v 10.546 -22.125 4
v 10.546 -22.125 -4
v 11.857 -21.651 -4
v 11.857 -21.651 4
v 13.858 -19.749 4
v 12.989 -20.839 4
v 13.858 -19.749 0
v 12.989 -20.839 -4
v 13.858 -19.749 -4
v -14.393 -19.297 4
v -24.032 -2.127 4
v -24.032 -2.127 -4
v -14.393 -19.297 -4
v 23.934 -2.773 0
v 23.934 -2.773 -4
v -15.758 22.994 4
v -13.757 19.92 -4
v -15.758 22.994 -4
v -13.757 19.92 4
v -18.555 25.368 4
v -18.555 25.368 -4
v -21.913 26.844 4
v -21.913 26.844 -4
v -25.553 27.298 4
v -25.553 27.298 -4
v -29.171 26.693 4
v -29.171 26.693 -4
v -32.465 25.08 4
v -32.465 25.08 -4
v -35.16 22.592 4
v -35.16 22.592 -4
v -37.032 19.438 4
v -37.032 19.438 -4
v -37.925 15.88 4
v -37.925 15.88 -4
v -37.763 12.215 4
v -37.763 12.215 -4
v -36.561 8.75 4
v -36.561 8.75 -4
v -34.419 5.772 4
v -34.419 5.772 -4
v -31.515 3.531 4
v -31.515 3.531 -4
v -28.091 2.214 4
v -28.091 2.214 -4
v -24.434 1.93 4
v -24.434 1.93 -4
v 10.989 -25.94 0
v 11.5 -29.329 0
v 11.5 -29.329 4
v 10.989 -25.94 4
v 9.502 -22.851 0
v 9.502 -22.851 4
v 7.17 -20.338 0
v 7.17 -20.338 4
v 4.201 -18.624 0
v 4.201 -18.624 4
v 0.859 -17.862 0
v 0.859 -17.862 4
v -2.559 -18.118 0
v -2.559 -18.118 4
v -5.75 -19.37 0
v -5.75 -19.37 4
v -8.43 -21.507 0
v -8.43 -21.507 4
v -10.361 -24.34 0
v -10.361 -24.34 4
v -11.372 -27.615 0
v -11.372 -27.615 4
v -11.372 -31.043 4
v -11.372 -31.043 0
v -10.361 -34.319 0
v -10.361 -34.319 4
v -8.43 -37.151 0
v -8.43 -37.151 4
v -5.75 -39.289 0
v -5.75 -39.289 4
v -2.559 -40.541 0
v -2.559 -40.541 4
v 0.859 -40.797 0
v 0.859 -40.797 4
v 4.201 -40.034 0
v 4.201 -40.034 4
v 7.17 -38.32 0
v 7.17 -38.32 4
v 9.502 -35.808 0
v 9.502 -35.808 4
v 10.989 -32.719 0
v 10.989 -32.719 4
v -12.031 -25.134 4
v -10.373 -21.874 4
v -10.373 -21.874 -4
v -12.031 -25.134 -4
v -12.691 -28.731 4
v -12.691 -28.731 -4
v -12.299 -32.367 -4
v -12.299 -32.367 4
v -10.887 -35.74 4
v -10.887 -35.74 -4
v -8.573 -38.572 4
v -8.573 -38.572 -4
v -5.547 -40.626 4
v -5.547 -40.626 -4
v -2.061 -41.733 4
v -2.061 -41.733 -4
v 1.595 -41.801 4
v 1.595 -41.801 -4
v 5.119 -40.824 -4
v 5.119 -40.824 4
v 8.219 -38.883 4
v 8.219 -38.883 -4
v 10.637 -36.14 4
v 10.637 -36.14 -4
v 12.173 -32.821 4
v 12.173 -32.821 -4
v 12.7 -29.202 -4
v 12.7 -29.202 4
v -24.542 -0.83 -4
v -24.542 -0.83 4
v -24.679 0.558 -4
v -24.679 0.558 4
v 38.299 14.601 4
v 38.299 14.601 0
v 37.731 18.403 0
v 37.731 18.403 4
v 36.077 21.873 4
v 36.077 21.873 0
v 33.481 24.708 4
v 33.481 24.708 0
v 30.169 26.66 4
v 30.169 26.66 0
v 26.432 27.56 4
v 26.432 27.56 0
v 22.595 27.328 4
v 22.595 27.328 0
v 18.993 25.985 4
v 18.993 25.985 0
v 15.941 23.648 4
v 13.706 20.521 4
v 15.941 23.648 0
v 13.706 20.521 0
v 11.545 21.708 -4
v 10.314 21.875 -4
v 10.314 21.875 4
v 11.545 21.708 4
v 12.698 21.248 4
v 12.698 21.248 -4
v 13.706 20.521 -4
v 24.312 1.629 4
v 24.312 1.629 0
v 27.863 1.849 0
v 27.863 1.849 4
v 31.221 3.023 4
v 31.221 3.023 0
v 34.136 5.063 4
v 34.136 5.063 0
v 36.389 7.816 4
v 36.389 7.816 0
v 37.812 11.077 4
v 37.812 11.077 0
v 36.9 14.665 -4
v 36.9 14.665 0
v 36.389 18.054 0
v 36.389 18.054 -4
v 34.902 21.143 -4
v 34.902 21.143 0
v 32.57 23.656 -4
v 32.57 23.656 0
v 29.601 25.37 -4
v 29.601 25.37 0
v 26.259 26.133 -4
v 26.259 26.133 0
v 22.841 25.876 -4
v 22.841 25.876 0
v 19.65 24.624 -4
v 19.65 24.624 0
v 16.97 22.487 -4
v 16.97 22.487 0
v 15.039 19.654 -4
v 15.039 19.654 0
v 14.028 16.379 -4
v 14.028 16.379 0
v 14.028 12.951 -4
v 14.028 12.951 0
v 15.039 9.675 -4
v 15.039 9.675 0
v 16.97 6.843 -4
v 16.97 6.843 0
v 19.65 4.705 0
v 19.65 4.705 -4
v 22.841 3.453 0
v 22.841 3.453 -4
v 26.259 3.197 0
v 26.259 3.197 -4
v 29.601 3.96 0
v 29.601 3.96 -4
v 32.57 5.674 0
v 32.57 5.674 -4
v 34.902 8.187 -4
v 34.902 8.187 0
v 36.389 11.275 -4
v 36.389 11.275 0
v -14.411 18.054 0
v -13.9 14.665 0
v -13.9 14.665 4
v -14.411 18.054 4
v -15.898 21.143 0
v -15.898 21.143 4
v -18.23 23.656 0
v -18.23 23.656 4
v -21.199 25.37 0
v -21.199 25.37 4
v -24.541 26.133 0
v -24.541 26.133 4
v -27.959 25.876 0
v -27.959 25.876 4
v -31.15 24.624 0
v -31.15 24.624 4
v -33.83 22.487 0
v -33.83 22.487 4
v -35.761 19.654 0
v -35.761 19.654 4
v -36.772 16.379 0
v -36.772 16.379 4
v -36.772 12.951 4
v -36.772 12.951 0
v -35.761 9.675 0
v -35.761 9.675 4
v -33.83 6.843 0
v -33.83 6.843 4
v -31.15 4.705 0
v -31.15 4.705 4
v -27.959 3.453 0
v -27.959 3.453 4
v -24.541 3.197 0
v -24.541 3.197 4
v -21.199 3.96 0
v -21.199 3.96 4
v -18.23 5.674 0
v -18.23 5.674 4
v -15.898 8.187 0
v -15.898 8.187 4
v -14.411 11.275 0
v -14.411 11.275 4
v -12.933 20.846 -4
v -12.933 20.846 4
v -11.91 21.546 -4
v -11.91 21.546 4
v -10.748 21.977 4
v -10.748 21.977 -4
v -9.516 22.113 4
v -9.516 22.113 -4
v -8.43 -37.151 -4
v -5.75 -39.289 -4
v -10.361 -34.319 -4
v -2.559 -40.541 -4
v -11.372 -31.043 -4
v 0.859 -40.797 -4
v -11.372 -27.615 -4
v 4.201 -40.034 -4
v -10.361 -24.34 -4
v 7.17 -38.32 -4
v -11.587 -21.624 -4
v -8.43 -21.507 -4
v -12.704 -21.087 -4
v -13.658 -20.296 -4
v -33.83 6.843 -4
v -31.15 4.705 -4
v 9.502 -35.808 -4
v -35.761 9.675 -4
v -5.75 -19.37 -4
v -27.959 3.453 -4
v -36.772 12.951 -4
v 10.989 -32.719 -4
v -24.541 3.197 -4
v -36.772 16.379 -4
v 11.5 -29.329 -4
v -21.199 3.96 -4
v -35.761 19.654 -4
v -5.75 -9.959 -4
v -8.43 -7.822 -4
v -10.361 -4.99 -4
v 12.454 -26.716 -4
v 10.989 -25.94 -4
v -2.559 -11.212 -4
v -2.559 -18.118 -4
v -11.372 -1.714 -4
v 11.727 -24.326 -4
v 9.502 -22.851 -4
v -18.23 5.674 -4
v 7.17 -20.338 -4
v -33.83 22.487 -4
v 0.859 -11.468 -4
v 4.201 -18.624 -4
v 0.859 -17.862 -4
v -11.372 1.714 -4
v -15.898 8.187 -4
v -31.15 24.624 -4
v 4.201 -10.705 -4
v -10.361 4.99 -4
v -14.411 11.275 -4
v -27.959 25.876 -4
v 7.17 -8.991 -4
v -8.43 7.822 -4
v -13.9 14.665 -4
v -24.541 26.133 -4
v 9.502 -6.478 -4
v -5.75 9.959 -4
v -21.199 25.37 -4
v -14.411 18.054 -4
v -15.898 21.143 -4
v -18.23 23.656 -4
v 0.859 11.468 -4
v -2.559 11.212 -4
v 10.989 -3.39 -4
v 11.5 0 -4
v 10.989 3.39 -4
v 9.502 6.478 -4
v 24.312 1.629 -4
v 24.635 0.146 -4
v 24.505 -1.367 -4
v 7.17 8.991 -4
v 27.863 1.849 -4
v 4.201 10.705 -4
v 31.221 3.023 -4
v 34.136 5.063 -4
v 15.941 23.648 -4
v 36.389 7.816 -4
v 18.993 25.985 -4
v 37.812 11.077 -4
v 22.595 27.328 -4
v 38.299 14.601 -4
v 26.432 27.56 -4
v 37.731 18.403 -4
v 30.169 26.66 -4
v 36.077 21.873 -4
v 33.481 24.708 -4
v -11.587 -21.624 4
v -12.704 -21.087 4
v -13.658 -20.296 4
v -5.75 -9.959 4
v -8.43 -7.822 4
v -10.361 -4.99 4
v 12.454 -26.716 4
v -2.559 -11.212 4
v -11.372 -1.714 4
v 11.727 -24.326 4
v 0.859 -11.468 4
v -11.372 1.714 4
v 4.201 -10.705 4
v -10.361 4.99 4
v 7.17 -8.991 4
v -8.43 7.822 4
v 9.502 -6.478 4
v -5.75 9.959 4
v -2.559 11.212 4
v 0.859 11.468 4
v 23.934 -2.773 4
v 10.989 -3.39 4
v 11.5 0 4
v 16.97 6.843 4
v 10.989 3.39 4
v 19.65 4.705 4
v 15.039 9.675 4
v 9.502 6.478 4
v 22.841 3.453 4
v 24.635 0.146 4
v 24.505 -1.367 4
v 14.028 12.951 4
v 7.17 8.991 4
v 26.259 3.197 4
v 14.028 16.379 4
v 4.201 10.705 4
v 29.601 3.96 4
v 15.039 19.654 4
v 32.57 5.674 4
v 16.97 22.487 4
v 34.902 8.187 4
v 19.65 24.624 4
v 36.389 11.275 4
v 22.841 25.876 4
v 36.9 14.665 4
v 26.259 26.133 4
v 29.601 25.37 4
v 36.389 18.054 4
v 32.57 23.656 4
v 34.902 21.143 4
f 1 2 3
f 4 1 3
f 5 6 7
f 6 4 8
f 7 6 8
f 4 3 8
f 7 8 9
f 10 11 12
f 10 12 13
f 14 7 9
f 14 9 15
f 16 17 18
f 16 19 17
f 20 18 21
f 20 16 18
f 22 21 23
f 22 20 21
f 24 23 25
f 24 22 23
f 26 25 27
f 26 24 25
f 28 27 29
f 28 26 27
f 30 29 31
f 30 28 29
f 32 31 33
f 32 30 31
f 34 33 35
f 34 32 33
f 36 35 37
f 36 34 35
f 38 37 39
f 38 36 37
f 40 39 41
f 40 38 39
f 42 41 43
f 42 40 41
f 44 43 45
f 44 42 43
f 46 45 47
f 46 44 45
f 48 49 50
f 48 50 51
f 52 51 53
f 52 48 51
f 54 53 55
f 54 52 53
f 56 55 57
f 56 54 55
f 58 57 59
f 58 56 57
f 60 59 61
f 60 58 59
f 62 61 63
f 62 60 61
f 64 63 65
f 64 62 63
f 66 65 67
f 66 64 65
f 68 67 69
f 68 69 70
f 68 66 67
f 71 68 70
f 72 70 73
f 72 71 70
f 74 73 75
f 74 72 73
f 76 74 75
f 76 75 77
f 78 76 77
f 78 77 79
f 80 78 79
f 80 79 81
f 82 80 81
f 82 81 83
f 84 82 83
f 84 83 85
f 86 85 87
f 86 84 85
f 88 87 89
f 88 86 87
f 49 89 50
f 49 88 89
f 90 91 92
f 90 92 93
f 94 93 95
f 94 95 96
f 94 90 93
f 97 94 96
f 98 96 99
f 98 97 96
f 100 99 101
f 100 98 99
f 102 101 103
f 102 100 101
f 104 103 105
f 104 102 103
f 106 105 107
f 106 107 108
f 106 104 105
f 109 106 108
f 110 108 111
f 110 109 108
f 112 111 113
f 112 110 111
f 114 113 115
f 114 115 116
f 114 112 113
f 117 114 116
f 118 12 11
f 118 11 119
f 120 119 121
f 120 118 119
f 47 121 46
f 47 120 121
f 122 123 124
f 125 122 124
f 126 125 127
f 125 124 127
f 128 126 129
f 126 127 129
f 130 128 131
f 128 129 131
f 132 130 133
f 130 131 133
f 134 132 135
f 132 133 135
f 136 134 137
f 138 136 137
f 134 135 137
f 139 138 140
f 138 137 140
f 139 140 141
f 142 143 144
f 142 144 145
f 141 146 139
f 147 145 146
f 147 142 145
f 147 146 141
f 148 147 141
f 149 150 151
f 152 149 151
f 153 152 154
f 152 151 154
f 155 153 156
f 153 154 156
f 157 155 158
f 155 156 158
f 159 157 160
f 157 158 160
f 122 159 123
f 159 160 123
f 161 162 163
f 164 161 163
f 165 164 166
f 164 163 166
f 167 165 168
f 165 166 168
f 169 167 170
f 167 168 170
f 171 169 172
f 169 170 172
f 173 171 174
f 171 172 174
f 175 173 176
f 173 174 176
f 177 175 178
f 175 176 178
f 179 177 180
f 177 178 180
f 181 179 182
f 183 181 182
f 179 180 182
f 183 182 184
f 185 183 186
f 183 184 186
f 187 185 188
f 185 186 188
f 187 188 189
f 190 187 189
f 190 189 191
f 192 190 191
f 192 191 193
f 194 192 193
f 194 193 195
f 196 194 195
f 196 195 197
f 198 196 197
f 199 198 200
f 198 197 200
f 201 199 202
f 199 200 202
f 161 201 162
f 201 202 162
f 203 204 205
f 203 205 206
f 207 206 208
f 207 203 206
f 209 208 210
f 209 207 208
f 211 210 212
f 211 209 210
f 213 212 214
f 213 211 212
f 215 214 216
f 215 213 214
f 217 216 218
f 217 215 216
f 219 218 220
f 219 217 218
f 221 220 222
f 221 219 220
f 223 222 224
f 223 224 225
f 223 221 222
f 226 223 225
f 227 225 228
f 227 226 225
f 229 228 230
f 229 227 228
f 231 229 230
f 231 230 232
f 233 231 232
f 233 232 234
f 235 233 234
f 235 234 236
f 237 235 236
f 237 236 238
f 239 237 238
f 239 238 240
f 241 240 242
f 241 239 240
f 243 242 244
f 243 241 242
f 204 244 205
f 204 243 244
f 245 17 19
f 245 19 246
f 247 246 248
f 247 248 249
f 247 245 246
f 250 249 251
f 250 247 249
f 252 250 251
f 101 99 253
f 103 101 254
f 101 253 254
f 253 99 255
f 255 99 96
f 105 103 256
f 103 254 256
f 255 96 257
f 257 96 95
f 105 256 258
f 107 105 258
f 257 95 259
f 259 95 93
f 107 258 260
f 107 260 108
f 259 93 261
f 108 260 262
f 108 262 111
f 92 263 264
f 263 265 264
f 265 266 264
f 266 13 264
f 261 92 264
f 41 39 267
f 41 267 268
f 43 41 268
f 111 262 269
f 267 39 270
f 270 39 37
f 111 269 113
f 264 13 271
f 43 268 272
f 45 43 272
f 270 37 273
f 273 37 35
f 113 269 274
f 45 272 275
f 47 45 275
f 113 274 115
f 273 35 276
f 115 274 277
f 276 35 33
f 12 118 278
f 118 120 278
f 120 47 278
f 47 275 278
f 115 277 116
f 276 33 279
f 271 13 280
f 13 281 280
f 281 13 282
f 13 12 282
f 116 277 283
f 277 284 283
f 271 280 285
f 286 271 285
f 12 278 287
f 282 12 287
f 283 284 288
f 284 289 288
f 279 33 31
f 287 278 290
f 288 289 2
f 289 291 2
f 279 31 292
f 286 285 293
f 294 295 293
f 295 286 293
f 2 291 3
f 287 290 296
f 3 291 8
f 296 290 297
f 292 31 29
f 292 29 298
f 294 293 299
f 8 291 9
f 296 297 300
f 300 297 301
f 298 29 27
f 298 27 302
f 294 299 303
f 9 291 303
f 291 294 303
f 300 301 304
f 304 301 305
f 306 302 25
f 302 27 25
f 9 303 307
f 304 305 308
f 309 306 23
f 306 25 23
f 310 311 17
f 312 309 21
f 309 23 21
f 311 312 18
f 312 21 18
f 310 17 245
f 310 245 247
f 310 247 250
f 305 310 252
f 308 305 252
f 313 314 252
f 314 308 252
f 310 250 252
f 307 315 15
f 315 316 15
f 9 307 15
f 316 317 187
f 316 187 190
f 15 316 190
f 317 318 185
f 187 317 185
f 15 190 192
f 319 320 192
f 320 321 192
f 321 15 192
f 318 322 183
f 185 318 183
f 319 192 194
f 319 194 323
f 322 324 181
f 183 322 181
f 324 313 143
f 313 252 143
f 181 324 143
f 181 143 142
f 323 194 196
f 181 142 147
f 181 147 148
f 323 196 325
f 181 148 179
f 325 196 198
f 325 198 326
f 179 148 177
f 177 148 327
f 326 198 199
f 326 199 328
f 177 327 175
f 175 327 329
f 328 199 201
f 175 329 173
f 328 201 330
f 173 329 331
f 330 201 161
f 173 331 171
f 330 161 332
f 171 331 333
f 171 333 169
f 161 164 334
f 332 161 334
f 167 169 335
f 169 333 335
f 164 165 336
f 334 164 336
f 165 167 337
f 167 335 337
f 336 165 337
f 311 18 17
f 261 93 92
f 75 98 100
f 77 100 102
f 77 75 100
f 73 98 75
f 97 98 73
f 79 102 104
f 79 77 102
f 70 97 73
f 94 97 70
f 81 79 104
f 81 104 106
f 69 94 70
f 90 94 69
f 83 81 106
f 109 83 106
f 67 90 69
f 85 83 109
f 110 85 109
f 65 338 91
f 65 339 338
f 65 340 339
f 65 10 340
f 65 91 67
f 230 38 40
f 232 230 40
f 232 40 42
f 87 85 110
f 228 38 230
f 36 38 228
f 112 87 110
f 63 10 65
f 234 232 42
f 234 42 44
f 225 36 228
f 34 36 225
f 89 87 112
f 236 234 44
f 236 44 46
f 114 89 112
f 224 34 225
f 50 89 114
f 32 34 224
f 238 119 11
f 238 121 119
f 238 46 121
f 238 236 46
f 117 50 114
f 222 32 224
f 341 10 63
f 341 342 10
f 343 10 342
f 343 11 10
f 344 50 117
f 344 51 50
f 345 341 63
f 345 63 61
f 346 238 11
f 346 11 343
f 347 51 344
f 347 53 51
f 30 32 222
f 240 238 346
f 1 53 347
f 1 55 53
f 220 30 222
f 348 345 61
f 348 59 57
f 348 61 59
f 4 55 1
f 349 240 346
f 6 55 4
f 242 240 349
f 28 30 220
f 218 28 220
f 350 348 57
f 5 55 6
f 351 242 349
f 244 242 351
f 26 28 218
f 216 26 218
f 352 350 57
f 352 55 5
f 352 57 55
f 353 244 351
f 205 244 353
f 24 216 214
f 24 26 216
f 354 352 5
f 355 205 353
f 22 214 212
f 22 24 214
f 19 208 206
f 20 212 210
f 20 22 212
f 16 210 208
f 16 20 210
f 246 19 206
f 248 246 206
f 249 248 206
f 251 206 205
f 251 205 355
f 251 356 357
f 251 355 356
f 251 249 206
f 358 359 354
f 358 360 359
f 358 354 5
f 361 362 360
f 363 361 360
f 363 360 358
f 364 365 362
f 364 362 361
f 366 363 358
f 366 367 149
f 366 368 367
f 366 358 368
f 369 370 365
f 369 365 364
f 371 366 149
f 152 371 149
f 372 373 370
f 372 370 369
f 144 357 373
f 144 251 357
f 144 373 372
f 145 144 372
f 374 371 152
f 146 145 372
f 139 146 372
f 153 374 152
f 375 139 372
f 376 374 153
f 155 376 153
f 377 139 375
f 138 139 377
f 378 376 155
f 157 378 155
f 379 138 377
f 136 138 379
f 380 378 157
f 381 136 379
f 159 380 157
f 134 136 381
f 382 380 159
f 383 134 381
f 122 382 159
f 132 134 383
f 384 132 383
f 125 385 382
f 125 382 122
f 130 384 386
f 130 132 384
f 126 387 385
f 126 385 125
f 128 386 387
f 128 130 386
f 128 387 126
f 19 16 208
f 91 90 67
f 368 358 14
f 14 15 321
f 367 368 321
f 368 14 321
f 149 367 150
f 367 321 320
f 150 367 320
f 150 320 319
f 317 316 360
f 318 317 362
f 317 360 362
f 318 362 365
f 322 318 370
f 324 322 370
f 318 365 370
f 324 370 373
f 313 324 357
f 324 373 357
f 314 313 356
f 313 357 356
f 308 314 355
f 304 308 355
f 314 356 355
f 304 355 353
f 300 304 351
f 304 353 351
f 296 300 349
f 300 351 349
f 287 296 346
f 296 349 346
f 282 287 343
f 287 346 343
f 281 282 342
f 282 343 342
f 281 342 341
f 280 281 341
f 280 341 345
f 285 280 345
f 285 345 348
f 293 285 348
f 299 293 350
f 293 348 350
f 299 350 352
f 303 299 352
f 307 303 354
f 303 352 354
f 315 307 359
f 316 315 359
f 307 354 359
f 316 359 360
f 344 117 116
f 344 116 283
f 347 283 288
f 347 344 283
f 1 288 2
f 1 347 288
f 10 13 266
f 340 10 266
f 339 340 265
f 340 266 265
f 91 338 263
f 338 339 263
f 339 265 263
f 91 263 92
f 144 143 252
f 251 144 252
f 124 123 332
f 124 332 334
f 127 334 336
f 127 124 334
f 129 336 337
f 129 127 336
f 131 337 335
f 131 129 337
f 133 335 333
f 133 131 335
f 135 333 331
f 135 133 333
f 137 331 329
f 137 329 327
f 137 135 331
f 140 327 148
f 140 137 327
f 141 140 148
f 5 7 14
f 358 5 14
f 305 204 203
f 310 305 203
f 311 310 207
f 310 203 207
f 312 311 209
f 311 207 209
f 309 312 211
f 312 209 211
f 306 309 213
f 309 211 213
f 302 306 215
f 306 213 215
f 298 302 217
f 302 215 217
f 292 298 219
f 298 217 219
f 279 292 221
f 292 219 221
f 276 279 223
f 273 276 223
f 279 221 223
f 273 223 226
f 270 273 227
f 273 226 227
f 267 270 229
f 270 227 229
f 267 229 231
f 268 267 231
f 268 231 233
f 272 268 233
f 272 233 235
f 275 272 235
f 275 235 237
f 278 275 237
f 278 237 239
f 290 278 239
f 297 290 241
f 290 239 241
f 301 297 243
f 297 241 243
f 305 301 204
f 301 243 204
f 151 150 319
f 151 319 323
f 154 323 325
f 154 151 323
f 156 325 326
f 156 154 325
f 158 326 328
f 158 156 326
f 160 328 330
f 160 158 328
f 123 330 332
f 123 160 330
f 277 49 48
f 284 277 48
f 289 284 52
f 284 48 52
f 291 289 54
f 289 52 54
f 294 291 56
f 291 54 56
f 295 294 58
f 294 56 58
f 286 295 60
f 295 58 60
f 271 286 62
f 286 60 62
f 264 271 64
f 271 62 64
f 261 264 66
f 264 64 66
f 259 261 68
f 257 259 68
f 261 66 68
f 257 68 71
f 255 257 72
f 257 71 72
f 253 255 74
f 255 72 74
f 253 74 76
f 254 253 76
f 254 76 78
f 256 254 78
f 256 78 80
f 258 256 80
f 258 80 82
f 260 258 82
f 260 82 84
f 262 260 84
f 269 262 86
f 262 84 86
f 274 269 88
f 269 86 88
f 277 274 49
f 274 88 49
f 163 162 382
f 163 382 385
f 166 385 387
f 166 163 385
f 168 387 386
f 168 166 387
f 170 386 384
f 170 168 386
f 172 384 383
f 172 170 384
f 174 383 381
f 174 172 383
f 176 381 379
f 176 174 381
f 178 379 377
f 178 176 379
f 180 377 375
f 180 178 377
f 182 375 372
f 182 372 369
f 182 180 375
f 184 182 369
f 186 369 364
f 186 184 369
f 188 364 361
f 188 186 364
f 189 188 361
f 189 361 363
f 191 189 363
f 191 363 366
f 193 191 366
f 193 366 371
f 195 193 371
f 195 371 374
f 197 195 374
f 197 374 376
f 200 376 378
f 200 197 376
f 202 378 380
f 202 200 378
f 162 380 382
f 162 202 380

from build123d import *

# Parameters (mm, degrees)
F2_DEPTH     = 4
F0_R         = 11.5
F3_DEPTH     = 4
F4_T1_DEPTH  = 21.9483713996
F4_T3_DEPTH  = 22.3459559115
F4_T5_DEPTH  = 21.2495705846
F4_T7_DEPTH  = 22.5954800676
F4_T9_DEPTH  = 22.5954384353
F4_T11_DEPTH = 21.948545213


# Not quite as in the source:
# - a fillet or chamfer that OpenCascade refuses, or shapes differently, is made with other operations: its cross-section is extruded or revolved along the edge and cut away or added


with BuildPart() as f2:
    # F1 (on Top) → F2 (new body, symmetric)
    with BuildSketch(Plane.XY):
        with BuildLine():
            ThreePointArc((-24.434154737, 1.9297075548), (-16.0117202716, 5.9282775779), (-12.5894382026, 14.6008752276))
            ThreePointArc((-12.5894382026, 14.6008752276), (-12.8847624083, 17.3237447508), (-13.7570001617, 19.9199797418))
            Line((-13.7570001617, 19.9199797418), (-24.434154737, 1.9297075548))
        make_face()
        with BuildLine():
            ThreePointArc((-13.7570001617, 19.9199797418), (-12.8847624083, 17.3237447508), (-12.5894382026, 14.6008752276))
            ThreePointArc((-12.5894382026, 14.6008752276), (-16.0117202716, 5.9282775779), (-24.434154737, 1.9297075548))
            Line((-24.434154737, 1.9297075548), (-25.3981637022, 0.3054186533))
            Line((-25.3981637022, 0.3054186533), (-12.9635821636, -21.842745649))
            Line((-12.9635821636, -21.842745649), (-10.3728090059, -21.8739002812))
            ThreePointArc((-10.3728090059, -21.8739002812), (0.1527093266, -16.5024942777), (10.54601793, -22.1254538984))
            Line((10.54601793, -22.1254538984), (12.4345815386, -22.1481643023))
            Line((12.4345815386, -22.1481643023), (25.3981637022, -0.3054186533))
            Line((25.3981637022, -0.3054186533), (24.3123835544, 1.6285456733))
            ThreePointArc((24.3123835544, 1.6285456733), (13.9458157922, 8.2323089444), (13.7055148895, 20.5212337137))
            Line((13.7055148895, 20.5212337137), (12.9635821636, 21.842745649))
            Line((12.9635821636, 21.842745649), (-12.4345815386, 22.1481643023))
            Line((-12.4345815386, 22.1481643023), (-13.7570001617, 19.9199797418))
        make_face()
        with BuildLine():
            Line((-24.434154737, 1.9297075548), (-13.7570001617, 19.9199797418))
            ThreePointArc((-13.7570001617, 19.9199797418), (-36.2108110271, 21.0826663094), (-24.434154737, 1.9297075548))
        make_face()
        with BuildLine():
            Line((24.3123835544, 1.6285456733), (13.7055148895, 20.5212337137))
            ThreePointArc((13.7055148895, 20.5212337137), (13.9458157922, 8.2323089444), (24.3123835544, 1.6285456733))
        make_face()
        with BuildLine():
            ThreePointArc((38.29859269, 14.6009373546), (28.3341688507, 27.2487571734), (13.7055148895, 20.5212337137))
            Line((13.7055148895, 20.5212337137), (24.3123835544, 1.6285456733))
            ThreePointArc((24.3123835544, 1.6285456733), (34.136115438, 5.0628952085), (38.29859269, 14.6009373546))
        make_face()
        with BuildLine():
            Line((10.54601793, -22.1254538984), (-10.3728090059, -21.8739002812))
            ThreePointArc((-10.3728090059, -21.8739002812), (-3.8441725784, -41.3058041995), (12.7, -29.2015761288))
            ThreePointArc((12.7, -29.2015761288), (12.1495766945, -25.5032270182), (10.54601793, -22.1254538984))
        make_face()
        with BuildLine():
            ThreePointArc((10.54601793, -22.1254538984), (0.1527093266, -16.5024942777), (-10.3728090059, -21.8739002812))
            Line((-10.3728090059, -21.8739002812), (10.54601793, -22.1254538984))
        make_face()
    extrude(amount=F2_DEPTH, both=True)

    # F0 (on Top) → F3 (cut, symmetric)
    with BuildSketch(Plane.XY):
        with Locations((-25.4, 14.6646968374)):
            Circle(F0_R)
        with Locations((25.4, 14.6646968374)):
            Circle(F0_R)
        with Locations((0, -29.3293936748)):
            Circle(F0_R)
        Circle(F0_R)
    extrude(amount=F3_DEPTH, both=True, mode=Mode.SUBTRACT)

    # F4: fillet of radius 5.08 on 6 edges, made by hand

    # F4_s2 → F4_t1 (cut)
    with BuildSketch(Plane.XY.offset(-10.9741856998)):
        with BuildLine():
            ThreePointArc((10.54601793, -22.1254538984), (12.4510077343, -21.2841478503), (13.8583678275, -19.7491821865))
            Line((13.8583678275, -19.7491821865), (12.4345815386, -22.1481643023))
            Line((12.4345815386, -22.1481643023), (10.54601793, -22.1254538984))
        make_face()
    extrude(amount=F4_T1_DEPTH, mode=Mode.SUBTRACT)

    # F4_s4 → F4_t3 (cut)
    with BuildSketch(Plane.XY.offset(-11.1729779558)):
        with BuildLine():
            ThreePointArc((23.9337937954, -2.7727813782), (24.6265549669, -0.6154246052), (24.3123835544, 1.6285456733))
            Line((24.3123835544, 1.6285456733), (25.3981637022, -0.3054186533))
            Line((25.3981637022, -0.3054186533), (23.9337937954, -2.7727813782))
        make_face()
    extrude(amount=F4_T3_DEPTH, mode=Mode.SUBTRACT)

    # F4_s6 → F4_t5 (cut)
    with BuildSketch(Plane.XY.offset(-10.6247852923)):
        with BuildLine():
            ThreePointArc((10.3138596228, 21.8746091608), (12.1354983401, 21.5132129748), (13.7055148895, 20.5212337137))
            Line((13.7055148895, 20.5212337137), (12.9635821636, 21.842745649))
            Line((12.9635821636, 21.842745649), (10.3138596228, 21.8746091608))
        make_face()
    extrude(amount=F4_T5_DEPTH, mode=Mode.SUBTRACT)

    # F4_s8 → F4_t7 (cut)
    with BuildSketch(Plane.XY.offset(-11.2977400338)):
        with BuildLine():
            ThreePointArc((-13.7570001617, 19.9199797418), (-11.910066672, 21.54587795), (-9.5156965617, 22.1130640513))
            Line((-9.5156965617, 22.1130640513), (-12.4345815386, 22.1481643023))
            Line((-12.4345815386, 22.1481643023), (-13.7570001617, 19.9199797418))
        make_face()
    extrude(amount=F4_T7_DEPTH, mode=Mode.SUBTRACT)

    # F4_s10 → F4_t9 (cut)
    with BuildSketch(Plane.XY.offset(-11.2977192176)):
        with BuildLine():
            ThreePointArc((-14.3926228669, -19.2973742433), (-12.7042844419, -21.0873382025), (-10.3728090059, -21.8739002812))
            Line((-10.3728090059, -21.8739002812), (-12.9635821636, -21.842745649))
            Line((-12.9635821636, -21.842745649), (-14.3926228669, -19.2973742433))
        make_face()
    extrude(amount=F4_T9_DEPTH, mode=Mode.SUBTRACT)

    # F4_s12 → F4_t11 (cut)
    with BuildSketch(Plane.XY.offset(-10.9742726065)):
        with BuildLine():
            ThreePointArc((-24.0324603731, -2.1271378125), (-24.6581063385, -0.1407771898), (-24.434154737, 1.9297075548))
            Line((-24.434154737, 1.9297075548), (-25.3981637022, 0.3054186533))
            Line((-25.3981637022, 0.3054186533), (-24.0324603731, -2.1271378125))
        make_face()
    extrude(amount=F4_T11_DEPTH, mode=Mode.SUBTRACT)


solid = f2.part
